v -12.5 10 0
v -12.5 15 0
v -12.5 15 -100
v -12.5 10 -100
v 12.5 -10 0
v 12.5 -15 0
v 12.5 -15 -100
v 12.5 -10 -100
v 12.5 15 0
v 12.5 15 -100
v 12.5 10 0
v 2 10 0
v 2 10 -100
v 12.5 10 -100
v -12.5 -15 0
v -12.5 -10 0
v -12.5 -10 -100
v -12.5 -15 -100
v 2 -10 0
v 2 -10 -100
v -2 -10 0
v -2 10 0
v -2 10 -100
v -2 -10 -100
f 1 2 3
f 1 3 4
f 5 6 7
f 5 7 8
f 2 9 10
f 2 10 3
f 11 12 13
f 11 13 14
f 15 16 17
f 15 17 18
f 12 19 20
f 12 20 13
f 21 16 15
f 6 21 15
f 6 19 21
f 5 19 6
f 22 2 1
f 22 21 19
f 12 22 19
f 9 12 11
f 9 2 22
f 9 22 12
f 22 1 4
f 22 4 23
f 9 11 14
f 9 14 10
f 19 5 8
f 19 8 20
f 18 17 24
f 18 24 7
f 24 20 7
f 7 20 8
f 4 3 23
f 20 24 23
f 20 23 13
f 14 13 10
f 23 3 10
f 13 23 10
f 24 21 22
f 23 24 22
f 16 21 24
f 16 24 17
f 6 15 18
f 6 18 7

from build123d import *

# Parameters (mm, degrees)
SKETCH1_W           = 4
SKETCH1_H           = 20
BOSS_EXTRUDE1_DEPTH = 100


with BuildPart() as part:
    # Sketch1 → Boss-Extrude1 (new body)
    with BuildSketch(Plane.XY):
        Polygon((-12.5, 15), (-12.5, 10), (-2, 10), (2, 10), (12.5, 10), (12.5, 15), align=None)
        Rectangle(SKETCH1_W, SKETCH1_H)
        Polygon((-12.5, -10), (-12.5, -15), (12.5, -15), (12.5, -10), (2, -10), (-2, -10), align=None)
    extrude(amount=-BOSS_EXTRUDE1_DEPTH)


solid = part.part
